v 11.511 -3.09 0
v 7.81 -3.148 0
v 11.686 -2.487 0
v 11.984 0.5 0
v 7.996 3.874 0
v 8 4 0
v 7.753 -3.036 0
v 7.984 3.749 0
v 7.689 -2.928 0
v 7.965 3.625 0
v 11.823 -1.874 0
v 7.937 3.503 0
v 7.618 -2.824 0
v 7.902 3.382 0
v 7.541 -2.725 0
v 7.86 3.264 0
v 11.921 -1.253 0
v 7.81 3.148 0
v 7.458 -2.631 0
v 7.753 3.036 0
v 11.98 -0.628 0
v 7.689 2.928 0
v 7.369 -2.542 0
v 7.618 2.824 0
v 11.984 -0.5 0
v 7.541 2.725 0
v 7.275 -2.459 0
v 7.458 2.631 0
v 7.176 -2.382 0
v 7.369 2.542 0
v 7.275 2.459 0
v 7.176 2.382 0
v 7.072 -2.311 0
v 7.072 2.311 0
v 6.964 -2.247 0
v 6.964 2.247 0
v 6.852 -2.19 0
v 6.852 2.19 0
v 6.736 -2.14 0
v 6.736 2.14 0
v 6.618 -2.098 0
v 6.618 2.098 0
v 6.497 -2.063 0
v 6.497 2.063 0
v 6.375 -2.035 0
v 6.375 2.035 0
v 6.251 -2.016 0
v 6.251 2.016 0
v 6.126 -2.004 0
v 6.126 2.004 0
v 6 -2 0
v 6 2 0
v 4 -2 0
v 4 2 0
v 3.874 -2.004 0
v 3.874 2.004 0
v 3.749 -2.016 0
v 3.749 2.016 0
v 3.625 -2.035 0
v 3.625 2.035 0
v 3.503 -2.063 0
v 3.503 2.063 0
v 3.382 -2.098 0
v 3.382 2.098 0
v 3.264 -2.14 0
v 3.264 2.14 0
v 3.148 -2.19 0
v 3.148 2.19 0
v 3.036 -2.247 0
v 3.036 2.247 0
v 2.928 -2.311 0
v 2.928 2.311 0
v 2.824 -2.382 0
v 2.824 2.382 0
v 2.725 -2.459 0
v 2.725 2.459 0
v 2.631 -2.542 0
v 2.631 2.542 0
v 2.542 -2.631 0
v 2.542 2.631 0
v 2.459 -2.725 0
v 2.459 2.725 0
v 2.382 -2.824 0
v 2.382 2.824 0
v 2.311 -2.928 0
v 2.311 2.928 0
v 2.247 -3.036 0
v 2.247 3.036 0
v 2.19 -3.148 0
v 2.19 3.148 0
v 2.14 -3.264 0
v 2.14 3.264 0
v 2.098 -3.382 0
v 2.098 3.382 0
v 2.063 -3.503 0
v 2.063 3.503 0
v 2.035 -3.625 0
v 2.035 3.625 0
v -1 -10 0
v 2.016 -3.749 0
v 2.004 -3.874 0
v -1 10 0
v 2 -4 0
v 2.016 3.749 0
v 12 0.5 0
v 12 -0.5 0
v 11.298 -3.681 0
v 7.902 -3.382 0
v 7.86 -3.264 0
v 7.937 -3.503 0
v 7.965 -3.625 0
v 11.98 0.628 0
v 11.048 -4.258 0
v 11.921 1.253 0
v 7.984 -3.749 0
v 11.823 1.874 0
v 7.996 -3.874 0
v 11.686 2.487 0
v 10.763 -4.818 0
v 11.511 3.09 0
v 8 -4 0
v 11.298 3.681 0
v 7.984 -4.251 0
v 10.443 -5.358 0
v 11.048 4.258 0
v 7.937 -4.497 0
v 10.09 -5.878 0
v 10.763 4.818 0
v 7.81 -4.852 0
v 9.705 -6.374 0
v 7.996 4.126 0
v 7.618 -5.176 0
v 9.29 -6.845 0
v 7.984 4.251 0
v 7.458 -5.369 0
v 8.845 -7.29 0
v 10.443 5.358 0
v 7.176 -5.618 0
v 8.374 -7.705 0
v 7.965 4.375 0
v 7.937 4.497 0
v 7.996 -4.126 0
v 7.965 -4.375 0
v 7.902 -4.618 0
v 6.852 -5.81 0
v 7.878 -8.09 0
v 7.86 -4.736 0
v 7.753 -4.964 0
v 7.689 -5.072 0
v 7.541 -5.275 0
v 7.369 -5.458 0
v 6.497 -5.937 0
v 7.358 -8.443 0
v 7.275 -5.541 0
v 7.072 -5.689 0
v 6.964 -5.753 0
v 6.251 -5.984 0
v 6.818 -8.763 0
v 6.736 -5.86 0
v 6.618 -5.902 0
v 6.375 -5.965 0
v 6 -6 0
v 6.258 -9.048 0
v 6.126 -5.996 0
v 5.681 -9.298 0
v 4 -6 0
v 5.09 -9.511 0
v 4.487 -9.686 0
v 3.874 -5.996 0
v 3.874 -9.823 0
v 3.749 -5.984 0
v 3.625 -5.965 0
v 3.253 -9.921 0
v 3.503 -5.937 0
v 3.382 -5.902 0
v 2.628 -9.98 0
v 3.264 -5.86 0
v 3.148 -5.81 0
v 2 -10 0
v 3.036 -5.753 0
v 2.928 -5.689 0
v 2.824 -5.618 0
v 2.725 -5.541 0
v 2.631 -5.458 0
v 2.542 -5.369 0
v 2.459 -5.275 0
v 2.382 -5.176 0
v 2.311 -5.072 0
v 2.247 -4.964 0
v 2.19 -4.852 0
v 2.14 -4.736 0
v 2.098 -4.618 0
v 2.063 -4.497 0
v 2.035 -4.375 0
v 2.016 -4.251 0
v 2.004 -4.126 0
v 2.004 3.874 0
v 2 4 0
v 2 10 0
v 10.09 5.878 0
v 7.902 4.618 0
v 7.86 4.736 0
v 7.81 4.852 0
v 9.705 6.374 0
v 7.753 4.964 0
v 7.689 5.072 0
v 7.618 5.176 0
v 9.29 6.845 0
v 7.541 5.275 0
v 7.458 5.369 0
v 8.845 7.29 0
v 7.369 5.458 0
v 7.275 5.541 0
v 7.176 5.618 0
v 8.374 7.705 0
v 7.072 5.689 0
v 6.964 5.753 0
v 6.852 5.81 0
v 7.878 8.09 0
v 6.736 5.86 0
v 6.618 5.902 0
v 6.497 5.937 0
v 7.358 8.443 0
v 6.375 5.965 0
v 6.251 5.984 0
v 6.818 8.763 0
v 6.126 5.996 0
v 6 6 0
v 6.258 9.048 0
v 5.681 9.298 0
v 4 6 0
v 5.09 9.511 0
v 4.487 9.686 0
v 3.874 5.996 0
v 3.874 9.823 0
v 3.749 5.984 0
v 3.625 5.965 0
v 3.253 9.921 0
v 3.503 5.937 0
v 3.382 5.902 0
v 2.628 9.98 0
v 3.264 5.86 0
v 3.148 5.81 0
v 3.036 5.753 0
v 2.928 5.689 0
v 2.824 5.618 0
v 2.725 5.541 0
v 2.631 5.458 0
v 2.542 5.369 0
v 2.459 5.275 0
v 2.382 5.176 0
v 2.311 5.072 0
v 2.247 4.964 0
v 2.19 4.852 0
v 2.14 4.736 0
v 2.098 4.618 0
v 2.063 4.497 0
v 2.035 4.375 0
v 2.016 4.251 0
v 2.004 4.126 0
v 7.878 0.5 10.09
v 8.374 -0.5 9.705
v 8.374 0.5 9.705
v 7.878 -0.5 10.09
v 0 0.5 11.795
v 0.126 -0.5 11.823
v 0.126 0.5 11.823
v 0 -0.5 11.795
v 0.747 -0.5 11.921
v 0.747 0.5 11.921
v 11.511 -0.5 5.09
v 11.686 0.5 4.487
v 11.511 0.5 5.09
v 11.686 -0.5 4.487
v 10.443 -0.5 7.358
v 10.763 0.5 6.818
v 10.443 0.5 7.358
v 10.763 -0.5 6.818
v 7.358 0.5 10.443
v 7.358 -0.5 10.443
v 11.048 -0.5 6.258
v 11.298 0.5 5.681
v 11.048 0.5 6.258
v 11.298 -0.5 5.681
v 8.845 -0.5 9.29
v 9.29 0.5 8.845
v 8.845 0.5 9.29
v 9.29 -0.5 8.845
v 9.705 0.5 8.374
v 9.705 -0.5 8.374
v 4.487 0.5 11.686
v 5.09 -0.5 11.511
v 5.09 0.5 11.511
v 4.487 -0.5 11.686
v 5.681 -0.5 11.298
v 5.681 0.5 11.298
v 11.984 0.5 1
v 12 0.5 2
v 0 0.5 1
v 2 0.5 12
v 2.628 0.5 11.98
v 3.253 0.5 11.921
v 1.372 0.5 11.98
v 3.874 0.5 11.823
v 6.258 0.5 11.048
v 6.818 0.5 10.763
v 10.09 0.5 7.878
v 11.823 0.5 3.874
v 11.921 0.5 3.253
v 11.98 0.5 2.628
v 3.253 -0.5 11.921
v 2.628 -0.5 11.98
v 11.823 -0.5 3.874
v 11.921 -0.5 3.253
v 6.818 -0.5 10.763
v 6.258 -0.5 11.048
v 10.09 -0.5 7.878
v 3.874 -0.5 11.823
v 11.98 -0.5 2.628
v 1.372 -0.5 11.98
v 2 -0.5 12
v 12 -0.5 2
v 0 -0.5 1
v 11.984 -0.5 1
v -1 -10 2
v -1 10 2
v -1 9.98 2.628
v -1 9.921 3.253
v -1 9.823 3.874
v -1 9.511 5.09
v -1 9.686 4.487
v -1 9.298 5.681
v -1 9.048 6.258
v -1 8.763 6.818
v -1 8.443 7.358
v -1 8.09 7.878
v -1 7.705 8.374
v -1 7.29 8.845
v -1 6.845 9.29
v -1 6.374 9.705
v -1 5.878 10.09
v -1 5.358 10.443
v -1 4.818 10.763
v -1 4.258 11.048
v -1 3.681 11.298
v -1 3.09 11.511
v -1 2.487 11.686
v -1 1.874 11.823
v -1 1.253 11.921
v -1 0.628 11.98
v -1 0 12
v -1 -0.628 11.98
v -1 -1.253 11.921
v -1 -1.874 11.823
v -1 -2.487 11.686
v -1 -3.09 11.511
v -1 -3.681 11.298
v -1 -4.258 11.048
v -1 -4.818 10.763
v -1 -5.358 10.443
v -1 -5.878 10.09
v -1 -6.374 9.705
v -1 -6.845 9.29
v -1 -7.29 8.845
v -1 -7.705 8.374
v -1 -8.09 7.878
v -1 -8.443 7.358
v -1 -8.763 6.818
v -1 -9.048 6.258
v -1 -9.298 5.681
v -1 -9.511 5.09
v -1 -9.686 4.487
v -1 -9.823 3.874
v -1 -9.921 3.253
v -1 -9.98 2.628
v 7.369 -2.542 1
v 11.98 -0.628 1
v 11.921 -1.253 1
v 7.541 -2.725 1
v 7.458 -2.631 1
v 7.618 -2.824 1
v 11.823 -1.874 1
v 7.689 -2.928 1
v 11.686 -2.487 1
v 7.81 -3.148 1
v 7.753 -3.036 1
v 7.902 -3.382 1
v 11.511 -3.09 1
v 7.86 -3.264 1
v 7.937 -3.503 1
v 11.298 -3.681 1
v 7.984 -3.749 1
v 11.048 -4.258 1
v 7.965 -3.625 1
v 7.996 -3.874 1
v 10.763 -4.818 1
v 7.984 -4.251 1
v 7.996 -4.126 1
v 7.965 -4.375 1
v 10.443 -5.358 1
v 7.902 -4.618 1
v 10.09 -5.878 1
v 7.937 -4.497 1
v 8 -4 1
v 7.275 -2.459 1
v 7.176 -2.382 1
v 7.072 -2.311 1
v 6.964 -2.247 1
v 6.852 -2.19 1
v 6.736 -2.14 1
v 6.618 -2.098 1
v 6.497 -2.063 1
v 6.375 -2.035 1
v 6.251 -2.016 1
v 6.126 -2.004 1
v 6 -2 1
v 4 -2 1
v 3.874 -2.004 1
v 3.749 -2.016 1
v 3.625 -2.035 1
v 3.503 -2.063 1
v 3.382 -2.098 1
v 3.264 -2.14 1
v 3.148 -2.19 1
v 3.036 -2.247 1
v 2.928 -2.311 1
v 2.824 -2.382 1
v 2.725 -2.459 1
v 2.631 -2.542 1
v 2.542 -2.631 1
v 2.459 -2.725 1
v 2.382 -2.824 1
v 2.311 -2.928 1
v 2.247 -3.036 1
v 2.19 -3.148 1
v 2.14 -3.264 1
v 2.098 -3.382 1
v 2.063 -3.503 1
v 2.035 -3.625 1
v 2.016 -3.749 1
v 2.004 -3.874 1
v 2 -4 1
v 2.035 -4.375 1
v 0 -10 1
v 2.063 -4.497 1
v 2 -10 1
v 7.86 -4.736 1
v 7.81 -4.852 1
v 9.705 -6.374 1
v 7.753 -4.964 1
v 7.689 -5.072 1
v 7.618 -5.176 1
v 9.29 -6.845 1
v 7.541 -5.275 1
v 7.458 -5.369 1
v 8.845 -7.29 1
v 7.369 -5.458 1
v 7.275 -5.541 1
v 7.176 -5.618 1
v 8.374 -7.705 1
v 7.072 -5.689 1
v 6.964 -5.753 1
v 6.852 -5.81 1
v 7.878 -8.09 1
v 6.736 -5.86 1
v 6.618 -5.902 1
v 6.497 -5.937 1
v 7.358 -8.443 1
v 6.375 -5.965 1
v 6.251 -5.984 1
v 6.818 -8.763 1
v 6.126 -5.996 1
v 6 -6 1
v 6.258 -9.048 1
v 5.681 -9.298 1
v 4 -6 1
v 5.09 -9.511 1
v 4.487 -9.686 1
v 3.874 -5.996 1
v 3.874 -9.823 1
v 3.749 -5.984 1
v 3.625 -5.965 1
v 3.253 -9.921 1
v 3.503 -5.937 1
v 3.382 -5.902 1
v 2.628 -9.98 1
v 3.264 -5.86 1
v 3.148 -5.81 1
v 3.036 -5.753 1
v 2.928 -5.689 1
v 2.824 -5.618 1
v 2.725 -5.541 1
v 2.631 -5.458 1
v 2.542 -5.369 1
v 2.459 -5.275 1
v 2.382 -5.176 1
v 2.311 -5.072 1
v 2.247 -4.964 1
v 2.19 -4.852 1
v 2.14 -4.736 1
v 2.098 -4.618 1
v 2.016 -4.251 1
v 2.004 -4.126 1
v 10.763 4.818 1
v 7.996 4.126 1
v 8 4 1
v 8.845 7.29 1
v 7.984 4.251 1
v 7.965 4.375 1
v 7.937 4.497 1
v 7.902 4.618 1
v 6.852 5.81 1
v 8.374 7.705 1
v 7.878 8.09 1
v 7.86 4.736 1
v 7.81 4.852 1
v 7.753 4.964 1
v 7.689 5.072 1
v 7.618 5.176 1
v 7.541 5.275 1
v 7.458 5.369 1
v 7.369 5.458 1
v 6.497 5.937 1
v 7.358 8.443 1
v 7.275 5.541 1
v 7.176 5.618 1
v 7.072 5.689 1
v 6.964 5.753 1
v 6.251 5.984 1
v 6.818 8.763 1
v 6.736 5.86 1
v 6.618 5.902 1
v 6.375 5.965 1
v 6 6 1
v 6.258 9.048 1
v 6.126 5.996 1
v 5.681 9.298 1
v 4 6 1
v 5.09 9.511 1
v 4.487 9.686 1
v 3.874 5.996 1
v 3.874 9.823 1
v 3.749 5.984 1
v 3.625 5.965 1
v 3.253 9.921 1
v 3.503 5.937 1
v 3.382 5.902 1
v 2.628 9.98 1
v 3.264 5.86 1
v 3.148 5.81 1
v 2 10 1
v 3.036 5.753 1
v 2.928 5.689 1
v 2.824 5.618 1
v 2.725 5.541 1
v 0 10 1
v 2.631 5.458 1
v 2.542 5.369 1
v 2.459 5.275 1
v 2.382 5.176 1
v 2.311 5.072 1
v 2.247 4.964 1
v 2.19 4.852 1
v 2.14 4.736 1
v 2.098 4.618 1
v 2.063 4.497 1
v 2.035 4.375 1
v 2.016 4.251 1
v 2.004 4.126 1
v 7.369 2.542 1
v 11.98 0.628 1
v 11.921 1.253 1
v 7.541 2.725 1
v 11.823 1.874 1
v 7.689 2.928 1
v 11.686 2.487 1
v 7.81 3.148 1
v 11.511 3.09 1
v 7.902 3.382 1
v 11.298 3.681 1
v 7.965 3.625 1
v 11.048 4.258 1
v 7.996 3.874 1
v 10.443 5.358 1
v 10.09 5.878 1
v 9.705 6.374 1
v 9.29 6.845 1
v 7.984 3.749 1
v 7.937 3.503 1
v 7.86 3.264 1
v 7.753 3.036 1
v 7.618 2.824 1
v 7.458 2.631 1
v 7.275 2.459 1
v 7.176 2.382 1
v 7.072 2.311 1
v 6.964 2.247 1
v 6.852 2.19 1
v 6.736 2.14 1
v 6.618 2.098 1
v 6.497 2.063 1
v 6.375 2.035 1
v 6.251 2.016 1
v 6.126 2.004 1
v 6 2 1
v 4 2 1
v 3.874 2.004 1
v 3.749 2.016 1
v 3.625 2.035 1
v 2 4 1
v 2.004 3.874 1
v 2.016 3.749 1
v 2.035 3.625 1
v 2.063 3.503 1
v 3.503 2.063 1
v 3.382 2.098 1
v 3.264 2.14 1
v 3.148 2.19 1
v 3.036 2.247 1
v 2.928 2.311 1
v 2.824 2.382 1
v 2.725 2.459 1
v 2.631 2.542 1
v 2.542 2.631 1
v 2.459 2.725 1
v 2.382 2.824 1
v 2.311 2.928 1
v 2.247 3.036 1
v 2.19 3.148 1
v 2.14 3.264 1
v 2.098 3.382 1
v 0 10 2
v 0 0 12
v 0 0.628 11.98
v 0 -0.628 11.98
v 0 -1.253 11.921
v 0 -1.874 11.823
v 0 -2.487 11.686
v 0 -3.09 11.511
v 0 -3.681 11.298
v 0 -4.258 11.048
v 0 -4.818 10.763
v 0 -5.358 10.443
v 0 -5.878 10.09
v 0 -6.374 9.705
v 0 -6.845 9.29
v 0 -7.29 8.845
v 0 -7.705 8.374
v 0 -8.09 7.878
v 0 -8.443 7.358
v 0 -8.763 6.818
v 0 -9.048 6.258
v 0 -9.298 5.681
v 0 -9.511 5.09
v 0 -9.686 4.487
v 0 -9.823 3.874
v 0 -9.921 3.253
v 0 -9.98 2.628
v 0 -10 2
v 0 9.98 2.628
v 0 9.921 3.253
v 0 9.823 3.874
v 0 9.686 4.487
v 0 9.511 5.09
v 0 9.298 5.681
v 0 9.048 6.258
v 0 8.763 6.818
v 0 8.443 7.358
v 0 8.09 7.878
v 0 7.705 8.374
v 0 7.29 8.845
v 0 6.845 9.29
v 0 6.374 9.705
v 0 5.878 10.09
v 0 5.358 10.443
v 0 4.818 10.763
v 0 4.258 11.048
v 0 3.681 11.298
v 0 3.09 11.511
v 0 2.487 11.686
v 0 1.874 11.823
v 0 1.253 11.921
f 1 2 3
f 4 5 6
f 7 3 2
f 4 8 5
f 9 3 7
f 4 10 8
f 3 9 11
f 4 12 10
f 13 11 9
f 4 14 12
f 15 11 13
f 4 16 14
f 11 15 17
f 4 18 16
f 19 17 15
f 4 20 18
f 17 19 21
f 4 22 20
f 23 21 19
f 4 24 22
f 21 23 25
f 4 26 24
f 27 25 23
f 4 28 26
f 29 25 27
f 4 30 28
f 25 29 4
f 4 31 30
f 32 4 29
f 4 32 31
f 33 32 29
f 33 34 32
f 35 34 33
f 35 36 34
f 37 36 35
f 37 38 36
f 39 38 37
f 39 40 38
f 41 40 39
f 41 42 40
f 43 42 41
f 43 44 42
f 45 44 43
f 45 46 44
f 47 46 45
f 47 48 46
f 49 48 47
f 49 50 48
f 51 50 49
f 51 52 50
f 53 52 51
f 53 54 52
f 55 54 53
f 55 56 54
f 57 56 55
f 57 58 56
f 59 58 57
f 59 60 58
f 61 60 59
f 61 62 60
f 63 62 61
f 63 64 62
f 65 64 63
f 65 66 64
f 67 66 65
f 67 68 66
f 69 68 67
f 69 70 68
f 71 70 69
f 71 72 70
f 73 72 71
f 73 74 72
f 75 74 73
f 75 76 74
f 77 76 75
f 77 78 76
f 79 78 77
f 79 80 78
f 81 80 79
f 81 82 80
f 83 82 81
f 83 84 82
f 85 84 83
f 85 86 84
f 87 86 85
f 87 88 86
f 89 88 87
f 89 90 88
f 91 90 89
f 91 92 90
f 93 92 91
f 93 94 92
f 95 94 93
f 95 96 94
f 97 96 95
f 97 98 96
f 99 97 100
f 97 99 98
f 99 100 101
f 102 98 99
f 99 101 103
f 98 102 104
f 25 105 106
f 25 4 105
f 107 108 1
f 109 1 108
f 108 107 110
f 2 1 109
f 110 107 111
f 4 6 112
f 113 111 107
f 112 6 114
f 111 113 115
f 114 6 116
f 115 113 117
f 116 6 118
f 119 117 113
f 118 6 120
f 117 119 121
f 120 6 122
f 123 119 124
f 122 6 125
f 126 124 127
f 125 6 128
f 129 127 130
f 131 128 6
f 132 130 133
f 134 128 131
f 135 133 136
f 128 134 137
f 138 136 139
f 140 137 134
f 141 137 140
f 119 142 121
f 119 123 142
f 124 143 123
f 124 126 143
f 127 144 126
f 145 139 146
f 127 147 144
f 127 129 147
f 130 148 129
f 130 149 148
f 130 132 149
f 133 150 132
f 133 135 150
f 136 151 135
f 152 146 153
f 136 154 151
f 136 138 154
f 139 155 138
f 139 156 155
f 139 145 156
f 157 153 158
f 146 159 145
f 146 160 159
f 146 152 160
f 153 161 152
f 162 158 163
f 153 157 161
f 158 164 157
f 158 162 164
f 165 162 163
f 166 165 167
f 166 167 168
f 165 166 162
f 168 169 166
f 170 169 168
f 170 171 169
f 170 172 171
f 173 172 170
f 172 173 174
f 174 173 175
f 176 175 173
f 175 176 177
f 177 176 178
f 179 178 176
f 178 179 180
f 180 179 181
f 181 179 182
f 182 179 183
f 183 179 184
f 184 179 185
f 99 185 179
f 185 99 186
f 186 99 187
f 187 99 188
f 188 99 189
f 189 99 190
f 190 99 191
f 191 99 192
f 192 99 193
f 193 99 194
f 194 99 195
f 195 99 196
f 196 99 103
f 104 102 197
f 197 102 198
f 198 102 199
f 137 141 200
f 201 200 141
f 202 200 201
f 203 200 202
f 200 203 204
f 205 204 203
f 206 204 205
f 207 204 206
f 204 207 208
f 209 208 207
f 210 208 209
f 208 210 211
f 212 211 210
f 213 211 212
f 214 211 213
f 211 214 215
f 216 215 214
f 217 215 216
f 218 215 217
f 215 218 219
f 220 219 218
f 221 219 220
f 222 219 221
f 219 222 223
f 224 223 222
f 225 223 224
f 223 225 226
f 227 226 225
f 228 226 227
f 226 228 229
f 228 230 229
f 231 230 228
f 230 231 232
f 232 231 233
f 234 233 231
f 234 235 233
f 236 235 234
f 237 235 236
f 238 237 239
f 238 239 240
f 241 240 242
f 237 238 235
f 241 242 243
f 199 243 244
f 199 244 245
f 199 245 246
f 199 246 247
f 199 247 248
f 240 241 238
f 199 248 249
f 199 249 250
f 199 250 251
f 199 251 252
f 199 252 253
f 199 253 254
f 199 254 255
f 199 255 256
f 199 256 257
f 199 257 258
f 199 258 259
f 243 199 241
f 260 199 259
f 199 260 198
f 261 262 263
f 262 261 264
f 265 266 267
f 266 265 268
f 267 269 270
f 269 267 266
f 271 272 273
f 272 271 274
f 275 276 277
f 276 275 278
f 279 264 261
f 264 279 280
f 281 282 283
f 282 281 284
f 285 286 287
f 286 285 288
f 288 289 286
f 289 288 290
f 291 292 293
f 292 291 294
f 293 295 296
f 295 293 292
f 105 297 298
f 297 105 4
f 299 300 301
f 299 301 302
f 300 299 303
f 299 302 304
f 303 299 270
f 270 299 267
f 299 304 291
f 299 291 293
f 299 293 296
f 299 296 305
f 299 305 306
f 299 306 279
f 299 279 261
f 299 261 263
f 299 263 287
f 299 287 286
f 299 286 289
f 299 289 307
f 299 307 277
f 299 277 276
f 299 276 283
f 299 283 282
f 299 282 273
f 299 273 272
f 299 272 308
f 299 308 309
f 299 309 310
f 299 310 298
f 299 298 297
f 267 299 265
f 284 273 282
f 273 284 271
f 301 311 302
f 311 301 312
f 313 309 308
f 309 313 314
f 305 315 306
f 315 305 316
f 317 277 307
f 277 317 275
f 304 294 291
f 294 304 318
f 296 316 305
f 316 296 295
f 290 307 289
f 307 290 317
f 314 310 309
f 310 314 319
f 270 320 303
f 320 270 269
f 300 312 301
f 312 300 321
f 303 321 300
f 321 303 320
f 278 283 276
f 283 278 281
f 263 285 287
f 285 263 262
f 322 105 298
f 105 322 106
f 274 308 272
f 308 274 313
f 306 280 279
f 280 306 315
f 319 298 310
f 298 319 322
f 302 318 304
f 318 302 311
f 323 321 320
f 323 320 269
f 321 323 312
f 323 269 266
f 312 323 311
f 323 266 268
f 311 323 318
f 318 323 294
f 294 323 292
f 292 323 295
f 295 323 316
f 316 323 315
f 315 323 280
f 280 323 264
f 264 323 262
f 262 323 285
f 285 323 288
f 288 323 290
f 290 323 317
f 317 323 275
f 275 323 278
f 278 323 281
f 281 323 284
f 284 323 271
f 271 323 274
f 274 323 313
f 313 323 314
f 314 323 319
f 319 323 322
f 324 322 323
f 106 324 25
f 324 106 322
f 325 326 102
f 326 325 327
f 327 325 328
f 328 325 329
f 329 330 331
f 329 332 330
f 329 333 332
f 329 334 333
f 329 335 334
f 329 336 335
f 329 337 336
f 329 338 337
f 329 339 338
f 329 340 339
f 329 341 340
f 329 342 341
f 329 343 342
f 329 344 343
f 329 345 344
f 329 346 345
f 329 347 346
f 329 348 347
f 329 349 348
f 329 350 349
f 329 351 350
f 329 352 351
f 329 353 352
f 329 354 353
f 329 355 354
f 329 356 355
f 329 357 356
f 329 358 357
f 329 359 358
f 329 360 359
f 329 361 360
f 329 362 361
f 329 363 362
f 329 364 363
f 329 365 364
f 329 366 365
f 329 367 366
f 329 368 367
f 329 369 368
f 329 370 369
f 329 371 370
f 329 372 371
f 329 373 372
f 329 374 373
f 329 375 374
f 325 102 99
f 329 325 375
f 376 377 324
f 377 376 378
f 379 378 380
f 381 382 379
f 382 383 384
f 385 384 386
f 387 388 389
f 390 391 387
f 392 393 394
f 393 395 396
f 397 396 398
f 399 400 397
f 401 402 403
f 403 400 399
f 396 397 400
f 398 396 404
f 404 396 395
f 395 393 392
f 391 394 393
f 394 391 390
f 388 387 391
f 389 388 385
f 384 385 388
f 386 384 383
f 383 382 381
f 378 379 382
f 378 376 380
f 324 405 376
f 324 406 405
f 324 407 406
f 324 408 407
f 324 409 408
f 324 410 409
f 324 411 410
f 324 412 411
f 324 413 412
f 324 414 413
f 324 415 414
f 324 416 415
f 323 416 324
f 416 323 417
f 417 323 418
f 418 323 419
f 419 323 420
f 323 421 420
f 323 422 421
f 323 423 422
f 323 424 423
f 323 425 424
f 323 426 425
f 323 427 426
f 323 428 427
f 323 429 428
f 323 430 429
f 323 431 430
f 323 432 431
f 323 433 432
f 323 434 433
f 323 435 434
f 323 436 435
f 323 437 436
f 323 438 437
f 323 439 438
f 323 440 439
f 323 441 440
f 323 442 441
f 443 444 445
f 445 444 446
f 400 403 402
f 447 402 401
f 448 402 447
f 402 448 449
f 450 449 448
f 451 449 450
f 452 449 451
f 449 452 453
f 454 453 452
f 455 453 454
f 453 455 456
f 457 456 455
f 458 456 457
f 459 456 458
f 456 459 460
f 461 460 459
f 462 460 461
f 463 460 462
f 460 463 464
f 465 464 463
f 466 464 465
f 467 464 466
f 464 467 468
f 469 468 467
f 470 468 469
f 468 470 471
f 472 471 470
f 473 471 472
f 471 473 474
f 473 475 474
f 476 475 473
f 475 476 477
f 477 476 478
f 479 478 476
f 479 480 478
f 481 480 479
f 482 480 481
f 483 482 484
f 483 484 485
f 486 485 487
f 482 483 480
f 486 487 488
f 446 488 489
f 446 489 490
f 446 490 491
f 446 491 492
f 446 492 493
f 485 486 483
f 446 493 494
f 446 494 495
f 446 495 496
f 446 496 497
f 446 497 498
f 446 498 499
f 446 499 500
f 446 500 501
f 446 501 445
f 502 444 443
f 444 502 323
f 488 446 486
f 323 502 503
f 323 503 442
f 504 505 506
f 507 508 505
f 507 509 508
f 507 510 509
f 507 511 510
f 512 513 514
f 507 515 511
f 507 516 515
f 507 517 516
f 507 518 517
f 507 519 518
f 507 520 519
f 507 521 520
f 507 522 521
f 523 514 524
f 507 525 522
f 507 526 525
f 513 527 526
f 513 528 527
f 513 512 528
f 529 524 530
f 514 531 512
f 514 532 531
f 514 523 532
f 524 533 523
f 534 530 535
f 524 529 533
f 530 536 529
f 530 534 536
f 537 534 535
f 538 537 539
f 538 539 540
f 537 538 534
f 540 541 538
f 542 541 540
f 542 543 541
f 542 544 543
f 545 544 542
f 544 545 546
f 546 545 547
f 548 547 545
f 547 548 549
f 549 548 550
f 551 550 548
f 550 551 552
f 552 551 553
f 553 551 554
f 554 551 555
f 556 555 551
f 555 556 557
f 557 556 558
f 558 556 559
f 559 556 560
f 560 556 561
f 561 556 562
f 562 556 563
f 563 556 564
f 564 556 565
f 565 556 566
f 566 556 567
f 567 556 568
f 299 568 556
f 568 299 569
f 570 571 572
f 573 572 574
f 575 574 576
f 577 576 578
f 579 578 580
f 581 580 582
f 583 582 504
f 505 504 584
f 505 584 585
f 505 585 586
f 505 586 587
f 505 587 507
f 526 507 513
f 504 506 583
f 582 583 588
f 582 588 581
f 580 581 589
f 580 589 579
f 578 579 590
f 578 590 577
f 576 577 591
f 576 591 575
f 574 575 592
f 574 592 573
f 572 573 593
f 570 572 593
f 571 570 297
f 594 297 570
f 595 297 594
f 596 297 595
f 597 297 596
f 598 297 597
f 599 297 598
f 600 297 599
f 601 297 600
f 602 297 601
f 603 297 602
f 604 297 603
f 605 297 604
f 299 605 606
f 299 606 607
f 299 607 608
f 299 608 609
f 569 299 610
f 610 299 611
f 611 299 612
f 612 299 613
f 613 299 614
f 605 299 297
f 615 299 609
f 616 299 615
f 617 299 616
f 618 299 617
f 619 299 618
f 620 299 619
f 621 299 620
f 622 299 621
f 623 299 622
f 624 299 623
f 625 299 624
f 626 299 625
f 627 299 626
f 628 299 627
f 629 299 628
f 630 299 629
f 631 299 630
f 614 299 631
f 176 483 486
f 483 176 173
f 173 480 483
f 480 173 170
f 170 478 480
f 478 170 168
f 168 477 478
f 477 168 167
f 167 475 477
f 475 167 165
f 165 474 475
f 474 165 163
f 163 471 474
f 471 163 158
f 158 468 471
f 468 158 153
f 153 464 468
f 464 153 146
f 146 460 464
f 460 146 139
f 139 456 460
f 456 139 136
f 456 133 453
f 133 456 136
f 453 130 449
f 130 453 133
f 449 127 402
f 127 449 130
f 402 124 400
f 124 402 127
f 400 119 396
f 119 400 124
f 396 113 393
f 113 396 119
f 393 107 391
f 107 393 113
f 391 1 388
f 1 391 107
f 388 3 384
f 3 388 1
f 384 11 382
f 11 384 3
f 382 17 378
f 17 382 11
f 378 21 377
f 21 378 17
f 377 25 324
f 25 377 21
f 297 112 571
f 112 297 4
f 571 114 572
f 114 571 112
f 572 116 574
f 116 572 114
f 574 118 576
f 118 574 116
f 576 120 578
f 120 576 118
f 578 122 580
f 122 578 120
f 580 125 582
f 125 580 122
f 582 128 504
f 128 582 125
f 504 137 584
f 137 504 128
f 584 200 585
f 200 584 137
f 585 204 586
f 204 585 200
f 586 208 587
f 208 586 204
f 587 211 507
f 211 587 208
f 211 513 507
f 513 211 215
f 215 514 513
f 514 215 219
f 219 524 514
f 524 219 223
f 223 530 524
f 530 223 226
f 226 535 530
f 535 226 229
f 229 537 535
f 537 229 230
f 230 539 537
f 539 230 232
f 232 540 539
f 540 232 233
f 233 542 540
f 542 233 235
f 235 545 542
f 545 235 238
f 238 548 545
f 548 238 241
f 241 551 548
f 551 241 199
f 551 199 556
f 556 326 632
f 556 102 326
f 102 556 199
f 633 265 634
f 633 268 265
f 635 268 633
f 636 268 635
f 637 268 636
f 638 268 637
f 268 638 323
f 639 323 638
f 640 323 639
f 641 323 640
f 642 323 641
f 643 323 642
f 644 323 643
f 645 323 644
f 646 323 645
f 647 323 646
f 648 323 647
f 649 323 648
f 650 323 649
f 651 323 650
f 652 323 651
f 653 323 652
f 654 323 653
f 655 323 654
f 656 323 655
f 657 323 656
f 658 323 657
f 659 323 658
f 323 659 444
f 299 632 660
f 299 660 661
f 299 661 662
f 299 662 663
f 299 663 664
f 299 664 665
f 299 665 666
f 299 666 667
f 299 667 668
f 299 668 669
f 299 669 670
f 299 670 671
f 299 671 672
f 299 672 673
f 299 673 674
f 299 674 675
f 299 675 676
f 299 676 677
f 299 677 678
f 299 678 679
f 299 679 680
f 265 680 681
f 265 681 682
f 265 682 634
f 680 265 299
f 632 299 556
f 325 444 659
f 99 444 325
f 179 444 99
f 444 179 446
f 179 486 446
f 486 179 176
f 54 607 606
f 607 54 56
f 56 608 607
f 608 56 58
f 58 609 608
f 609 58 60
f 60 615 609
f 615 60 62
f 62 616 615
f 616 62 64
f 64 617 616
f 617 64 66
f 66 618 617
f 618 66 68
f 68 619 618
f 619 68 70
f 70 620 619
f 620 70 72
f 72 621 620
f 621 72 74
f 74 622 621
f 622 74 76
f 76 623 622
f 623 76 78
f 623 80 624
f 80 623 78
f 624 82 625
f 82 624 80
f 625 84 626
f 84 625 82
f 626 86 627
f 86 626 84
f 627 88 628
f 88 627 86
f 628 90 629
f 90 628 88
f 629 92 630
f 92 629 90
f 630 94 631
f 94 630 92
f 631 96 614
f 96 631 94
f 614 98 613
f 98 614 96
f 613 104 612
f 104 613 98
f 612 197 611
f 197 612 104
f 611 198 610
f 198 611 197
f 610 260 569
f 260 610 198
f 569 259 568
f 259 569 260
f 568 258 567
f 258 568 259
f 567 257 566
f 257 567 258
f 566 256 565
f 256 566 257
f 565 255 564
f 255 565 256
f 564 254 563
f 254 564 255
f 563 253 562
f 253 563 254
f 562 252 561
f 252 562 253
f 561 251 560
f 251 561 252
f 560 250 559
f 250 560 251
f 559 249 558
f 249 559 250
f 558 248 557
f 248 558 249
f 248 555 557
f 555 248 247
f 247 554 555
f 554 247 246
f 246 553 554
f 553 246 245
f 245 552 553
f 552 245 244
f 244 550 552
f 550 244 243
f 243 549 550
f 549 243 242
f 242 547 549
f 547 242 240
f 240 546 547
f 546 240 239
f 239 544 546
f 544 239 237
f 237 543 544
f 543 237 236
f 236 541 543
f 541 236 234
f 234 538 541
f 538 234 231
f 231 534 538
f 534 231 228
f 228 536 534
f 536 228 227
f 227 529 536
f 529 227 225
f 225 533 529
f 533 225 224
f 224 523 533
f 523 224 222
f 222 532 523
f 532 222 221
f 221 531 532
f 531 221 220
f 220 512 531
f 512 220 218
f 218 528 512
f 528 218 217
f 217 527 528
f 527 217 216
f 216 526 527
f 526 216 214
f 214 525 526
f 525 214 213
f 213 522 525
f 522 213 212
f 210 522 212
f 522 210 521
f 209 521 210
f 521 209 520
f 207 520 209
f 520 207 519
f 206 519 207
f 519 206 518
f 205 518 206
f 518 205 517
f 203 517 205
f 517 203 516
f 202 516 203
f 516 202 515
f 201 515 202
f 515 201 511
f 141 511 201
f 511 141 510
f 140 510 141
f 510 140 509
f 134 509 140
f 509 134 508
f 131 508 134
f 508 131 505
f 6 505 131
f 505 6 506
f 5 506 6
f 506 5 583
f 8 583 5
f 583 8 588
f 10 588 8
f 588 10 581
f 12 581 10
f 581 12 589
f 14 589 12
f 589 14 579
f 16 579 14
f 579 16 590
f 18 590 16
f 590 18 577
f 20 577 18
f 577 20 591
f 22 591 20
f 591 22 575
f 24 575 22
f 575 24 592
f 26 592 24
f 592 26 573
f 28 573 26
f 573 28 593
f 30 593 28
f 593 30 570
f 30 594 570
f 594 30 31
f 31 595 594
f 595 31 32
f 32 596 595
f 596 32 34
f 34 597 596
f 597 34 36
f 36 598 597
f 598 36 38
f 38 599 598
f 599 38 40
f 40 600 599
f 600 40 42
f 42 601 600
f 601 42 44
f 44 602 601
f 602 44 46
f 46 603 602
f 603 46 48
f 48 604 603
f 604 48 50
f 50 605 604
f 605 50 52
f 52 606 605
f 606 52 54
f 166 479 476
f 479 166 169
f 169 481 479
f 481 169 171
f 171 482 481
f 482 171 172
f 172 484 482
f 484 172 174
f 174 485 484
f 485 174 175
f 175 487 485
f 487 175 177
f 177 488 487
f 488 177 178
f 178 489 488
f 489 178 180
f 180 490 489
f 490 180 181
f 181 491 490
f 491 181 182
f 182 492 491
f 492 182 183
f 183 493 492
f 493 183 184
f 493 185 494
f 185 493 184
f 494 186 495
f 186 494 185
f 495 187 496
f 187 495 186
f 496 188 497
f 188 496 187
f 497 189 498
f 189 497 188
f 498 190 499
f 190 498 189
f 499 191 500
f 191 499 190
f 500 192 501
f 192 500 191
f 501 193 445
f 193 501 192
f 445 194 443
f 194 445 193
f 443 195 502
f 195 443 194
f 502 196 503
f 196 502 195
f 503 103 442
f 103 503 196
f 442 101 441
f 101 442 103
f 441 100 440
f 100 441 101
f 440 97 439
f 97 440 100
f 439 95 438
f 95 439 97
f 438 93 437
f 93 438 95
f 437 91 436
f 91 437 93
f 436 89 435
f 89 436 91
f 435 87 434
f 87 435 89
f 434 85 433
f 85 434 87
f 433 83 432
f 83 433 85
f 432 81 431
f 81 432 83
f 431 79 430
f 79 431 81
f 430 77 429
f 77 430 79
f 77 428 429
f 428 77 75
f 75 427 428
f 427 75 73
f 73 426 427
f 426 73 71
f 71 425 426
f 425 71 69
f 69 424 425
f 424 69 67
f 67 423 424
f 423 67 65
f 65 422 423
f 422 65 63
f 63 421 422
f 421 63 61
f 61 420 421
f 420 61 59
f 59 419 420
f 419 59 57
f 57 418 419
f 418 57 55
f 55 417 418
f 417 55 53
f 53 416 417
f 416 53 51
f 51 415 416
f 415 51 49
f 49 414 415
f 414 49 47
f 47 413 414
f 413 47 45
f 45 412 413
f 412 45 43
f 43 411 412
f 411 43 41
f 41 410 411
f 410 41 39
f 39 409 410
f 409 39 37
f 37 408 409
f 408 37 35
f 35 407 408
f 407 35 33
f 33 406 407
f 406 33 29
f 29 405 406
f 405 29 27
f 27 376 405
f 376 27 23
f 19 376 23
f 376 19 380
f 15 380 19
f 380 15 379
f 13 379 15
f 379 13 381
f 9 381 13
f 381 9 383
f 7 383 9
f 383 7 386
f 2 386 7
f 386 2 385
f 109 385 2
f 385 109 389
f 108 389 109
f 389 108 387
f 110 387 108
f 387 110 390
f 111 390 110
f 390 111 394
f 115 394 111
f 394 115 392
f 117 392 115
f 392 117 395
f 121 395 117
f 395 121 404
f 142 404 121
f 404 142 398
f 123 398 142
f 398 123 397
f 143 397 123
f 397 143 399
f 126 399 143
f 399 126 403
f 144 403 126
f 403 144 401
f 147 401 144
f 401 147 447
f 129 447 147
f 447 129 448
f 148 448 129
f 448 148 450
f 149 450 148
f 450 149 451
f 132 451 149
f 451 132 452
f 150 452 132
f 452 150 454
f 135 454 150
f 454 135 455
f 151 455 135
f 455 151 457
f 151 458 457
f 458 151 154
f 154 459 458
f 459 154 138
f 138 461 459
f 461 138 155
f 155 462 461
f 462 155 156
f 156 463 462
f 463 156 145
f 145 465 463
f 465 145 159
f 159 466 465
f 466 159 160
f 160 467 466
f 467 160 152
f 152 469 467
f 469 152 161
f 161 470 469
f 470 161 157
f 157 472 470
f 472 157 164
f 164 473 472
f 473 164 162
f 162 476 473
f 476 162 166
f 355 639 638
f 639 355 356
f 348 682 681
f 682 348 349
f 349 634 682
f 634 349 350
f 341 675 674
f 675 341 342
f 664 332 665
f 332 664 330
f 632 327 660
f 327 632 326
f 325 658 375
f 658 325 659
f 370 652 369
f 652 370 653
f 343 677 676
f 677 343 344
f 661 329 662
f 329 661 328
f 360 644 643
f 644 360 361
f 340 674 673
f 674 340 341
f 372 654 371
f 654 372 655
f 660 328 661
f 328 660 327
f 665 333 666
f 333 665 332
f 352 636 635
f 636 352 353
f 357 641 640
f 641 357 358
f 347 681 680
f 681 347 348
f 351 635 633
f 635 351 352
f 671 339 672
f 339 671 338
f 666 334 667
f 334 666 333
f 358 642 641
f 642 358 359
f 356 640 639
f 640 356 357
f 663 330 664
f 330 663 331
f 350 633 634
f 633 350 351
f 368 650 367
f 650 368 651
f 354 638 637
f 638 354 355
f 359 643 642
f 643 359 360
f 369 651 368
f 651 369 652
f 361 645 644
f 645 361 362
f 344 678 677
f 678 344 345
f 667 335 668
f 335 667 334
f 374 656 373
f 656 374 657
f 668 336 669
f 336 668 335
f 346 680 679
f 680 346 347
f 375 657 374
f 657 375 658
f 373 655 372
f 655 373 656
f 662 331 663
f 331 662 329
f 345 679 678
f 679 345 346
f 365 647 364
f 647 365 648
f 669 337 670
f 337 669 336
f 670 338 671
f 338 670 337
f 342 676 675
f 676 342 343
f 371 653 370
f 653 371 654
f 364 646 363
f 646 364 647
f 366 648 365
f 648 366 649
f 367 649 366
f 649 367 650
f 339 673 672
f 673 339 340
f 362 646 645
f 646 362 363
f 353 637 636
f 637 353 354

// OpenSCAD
module l_bracket_face(bolt_hole, with_holes=false) {
  length = 3 * bolt_hole;
  width = 5 * bolt_hole;
  
  difference() {
    translate([(length-width/2)/2, 0]) {
      translate([(length-width/2)/2, 0]) {
        difference() {
          circle(d = width);
          translate([-width/4, 0]) {
            square([width/2, width], center = true);
          }
        }
      }
      square([length-width/2, width], center=true);
    }
    if(with_holes) {
      hull() {
        translate([bolt_hole, bolt_hole]) {
          circle(d=bolt_hole);
        }
        translate([bolt_hole * 1.5, bolt_hole]) {
          circle(d=bolt_hole);
        }
      }
      hull() {
        translate([bolt_hole, -bolt_hole]) {
          circle(d=bolt_hole);
        }
        translate([bolt_hole * 1.5, -bolt_hole]) {
          circle(d=bolt_hole);
        }
      }
    }
  }
}

module l_bracket() {
  bolt_hole = 4;
  thickness = 1;
  $fn=100;

  linear_extrude(thickness) {
    l_bracket_face(bolt_hole, true);
  }
  rotate([0, -90, 0]) {
    linear_extrude(thickness) {
      l_bracket_face(bolt_hole, false);
    }
  }
  difference() {
    translate([2 * thickness, thickness/2, 0]) {
      rotate([0, -90, 90]) {
        linear_extrude(thickness) {
          l_bracket_face(bolt_hole, false);
        }
      }
    }
    translate([-thickness, 0, 0]) {
      rotate([0,-90,0]) {
        cylinder(h=2*bolt_hole,r=3*bolt_hole);
      }
    }
  }
}

l_bracket();
